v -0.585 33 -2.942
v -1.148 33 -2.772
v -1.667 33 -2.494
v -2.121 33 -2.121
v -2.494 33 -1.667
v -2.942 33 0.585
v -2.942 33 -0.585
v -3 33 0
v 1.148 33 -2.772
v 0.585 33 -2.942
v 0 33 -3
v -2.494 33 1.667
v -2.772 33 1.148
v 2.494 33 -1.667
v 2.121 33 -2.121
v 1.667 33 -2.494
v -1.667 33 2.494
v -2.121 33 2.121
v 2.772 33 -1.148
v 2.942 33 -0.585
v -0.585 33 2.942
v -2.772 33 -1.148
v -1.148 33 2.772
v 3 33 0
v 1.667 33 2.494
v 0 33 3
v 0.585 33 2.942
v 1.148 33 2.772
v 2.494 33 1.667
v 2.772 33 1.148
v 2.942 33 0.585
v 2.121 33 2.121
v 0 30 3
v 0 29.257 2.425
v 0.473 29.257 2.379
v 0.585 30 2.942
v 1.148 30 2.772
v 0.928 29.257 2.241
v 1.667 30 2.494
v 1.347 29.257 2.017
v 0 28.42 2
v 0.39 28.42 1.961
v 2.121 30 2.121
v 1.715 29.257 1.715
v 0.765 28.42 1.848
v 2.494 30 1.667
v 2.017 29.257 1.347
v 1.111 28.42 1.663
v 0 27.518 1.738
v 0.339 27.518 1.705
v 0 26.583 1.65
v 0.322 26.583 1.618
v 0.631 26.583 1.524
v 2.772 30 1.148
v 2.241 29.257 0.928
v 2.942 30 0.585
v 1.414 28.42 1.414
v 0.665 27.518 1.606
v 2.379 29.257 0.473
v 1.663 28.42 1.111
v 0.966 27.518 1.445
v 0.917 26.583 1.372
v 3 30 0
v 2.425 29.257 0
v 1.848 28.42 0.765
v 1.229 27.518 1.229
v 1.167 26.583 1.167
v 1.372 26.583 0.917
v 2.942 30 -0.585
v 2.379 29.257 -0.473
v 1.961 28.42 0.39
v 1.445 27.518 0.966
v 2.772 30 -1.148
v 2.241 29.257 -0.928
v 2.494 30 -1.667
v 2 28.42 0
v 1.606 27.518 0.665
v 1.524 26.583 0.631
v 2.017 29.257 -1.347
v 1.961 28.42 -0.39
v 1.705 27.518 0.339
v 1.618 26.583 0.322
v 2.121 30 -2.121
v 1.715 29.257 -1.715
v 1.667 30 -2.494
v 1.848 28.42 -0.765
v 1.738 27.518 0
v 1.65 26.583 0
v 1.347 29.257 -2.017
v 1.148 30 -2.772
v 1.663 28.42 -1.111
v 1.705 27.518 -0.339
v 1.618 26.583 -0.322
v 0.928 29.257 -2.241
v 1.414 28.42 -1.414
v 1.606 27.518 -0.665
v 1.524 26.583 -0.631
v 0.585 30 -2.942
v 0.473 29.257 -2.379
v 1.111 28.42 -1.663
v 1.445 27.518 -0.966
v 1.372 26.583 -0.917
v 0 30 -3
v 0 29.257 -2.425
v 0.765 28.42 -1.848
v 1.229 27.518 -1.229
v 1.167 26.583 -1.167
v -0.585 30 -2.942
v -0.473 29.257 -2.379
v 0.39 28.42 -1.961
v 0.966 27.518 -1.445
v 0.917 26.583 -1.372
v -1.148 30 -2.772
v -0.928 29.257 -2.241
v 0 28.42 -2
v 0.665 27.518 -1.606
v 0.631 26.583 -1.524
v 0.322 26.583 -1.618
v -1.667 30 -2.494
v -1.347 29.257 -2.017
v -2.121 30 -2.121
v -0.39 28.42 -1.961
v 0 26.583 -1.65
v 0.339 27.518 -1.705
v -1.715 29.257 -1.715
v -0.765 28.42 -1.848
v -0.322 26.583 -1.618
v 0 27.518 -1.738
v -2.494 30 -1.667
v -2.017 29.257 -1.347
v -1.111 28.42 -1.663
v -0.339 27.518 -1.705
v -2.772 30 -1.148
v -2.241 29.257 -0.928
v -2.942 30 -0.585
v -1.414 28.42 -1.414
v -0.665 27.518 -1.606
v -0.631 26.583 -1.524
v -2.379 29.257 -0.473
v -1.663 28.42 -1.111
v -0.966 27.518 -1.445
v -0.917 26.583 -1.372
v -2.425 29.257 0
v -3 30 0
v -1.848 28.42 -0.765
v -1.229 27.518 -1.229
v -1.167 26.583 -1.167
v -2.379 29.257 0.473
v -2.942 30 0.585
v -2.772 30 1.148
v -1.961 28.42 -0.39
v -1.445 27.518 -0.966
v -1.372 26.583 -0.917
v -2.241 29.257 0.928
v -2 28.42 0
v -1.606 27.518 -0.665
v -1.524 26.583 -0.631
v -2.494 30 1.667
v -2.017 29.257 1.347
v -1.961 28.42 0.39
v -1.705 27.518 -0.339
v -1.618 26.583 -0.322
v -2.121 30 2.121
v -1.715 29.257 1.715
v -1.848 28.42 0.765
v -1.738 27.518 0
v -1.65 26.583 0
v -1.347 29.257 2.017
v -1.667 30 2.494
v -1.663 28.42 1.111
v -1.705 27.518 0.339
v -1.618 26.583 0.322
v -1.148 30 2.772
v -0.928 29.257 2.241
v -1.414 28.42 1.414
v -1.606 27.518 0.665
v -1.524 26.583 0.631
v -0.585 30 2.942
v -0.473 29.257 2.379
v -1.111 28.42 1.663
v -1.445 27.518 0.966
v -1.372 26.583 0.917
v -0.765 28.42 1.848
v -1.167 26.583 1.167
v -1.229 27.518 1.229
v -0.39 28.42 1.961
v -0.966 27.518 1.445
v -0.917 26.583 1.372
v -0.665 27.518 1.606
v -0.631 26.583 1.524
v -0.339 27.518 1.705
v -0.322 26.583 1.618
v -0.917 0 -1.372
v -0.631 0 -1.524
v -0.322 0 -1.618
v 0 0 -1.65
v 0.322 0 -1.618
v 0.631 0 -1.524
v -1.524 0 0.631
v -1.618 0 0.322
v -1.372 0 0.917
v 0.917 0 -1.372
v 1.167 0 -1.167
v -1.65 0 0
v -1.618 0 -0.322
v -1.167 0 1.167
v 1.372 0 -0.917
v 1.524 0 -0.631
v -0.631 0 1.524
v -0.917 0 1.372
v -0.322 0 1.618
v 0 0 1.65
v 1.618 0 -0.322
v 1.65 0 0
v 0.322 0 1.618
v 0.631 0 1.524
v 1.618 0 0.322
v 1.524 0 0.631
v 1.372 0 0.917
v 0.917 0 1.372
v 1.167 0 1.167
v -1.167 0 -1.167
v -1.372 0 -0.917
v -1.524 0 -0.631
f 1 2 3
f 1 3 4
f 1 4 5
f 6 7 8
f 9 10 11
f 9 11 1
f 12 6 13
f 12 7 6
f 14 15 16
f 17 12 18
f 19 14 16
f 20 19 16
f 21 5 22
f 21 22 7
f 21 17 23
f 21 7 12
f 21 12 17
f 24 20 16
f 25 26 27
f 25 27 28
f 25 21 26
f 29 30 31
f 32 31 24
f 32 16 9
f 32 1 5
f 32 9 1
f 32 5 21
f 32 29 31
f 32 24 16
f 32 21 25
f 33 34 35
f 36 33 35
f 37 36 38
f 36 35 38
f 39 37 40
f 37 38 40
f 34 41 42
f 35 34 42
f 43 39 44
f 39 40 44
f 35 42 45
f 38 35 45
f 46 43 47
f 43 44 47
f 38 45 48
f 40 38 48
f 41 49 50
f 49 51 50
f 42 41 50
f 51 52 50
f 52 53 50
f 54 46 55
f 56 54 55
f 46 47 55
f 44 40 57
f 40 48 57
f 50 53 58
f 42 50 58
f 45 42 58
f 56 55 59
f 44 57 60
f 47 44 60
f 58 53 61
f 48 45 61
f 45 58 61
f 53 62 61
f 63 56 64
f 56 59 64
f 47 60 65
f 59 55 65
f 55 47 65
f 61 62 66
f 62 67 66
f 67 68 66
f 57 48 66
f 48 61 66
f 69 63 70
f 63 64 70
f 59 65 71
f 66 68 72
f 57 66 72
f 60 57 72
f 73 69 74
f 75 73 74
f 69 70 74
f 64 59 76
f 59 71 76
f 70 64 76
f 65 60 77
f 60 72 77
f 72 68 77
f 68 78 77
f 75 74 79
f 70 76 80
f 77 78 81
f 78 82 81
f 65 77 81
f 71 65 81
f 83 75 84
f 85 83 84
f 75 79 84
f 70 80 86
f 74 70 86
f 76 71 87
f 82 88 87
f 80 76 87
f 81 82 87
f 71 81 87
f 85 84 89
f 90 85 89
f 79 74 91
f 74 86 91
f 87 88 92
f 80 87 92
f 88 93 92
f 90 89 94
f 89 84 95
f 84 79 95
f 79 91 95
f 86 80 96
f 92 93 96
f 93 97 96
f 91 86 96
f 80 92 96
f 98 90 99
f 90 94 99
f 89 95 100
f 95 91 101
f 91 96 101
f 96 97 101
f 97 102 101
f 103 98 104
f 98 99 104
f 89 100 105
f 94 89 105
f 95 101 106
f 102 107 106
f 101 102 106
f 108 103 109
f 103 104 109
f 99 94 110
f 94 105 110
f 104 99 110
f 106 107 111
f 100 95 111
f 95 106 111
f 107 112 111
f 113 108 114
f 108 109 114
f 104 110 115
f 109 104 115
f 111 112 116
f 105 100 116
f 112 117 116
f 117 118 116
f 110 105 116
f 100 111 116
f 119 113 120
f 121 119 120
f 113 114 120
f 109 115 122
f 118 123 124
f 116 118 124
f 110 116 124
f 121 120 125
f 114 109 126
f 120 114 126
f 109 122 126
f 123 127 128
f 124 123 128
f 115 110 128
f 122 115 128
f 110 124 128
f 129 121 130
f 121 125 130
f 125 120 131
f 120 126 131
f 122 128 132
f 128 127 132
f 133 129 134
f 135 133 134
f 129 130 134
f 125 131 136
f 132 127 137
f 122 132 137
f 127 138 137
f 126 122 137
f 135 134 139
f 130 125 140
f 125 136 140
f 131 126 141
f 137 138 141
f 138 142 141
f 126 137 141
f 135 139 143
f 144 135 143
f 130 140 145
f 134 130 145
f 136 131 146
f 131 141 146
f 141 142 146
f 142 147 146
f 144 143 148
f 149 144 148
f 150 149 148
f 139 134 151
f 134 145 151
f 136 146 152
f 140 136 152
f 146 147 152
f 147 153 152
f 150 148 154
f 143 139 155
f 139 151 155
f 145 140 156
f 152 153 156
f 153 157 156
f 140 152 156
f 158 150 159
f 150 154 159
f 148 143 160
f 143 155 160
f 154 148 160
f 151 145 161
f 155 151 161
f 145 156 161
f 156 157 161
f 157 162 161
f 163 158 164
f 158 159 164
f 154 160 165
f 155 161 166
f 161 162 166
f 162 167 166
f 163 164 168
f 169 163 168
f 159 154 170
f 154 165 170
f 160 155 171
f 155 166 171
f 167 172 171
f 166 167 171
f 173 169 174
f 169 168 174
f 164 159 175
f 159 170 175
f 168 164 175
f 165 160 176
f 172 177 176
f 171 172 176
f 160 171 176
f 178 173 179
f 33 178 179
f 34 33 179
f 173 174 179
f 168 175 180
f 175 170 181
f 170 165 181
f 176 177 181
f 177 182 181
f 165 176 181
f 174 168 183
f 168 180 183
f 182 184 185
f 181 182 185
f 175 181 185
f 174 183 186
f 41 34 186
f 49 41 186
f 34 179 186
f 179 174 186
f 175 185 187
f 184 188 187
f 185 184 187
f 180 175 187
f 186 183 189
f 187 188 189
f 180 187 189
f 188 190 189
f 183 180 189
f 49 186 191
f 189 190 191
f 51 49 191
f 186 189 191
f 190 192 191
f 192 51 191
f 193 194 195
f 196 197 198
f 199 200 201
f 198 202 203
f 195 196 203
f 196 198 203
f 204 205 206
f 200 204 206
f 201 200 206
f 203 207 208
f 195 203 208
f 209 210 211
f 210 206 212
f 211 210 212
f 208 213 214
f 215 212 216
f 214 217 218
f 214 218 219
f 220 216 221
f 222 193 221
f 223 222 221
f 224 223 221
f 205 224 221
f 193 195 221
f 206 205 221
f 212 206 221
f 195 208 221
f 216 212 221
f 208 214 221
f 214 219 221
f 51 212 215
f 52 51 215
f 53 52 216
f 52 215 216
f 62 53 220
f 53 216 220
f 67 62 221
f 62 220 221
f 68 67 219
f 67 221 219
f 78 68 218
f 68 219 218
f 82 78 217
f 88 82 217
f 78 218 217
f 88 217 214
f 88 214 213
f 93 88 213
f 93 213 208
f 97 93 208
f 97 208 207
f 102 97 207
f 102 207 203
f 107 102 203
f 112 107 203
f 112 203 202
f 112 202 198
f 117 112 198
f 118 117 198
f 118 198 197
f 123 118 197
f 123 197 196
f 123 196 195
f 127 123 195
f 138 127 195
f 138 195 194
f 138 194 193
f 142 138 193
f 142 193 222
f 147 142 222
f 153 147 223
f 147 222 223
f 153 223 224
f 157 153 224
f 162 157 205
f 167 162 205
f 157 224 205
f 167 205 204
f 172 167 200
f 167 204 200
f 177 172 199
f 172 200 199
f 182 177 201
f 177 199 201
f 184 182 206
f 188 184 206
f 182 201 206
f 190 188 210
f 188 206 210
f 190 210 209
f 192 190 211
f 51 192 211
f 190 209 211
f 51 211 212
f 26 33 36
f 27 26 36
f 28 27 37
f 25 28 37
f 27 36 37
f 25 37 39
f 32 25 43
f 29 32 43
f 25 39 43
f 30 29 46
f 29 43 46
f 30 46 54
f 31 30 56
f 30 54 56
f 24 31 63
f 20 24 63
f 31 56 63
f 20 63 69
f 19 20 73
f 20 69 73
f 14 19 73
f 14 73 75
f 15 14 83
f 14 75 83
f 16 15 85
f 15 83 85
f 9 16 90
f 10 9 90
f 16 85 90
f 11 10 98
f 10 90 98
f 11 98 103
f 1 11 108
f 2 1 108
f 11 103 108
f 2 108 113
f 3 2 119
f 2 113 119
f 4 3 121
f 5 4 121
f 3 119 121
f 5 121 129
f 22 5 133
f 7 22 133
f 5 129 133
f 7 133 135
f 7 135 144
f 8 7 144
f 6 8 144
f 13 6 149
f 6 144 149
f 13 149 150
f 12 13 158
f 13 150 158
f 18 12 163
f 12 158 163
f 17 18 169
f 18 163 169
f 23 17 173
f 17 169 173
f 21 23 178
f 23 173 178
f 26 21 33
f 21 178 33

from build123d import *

# Parameters (mm, degrees)
SKETCH1_R           = 1.65
BOSS_EXTRUDE1_DEPTH = 30
SKETCH2_R           = 3
BOSS_EXTRUDE2_DEPTH = 3
FILLET1_R           = 5


with BuildPart() as part:
    # Sketch1 → Boss-Extrude1 (new body)
    with BuildSketch(Plane(origin=(0, 0, 0), x_dir=(1, 0, 0), z_dir=(0, 1, 0))):
        with Locations(Location((0, 0, 0), (0, 0, 270))):
            Circle(SKETCH1_R)
    extrude(amount=BOSS_EXTRUDE1_DEPTH)

    # Sketch2 → Boss-Extrude2 (add)
    with BuildSketch(Plane(origin=(0, 30, 0), x_dir=(1, 0, 0), z_dir=(0, 1, 0))):
        with Locations(Location((0, 0, 0), (0, 0, 270))):
            Circle(SKETCH2_R)
    extrude(amount=BOSS_EXTRUDE2_DEPTH)

    # Fillet1
    # the kernel refuses this fillet: 5 mm, written as the material it adds along each edge
    with BuildSketch(Plane(origin=(0, 30, 0), x_dir=(0, 0, 1), z_dir=(-1, 0, 0))) as fillet1_piece_1:
        with BuildLine():
            CenterArc((6.65, -3.417235725), FILLET1_R, 136.886394054, 43.113605946)
            Line((1.65, -3.417235725), (1.55, -3.417235725))
            Line((1.55, -3.417235725), (1.55, 0))
            Line((1.55, 0), (1.65, 0.1))
            ThreePointArc((1.65, 0.1), (2.325, 0.1), (2.927, 0.068344714))
            Line((2.927, 0.068344714), (3, 0))
        make_face()
    revolve(axis=Axis((0, 30, 0), (0, 1, 0)))


solid = part.part
